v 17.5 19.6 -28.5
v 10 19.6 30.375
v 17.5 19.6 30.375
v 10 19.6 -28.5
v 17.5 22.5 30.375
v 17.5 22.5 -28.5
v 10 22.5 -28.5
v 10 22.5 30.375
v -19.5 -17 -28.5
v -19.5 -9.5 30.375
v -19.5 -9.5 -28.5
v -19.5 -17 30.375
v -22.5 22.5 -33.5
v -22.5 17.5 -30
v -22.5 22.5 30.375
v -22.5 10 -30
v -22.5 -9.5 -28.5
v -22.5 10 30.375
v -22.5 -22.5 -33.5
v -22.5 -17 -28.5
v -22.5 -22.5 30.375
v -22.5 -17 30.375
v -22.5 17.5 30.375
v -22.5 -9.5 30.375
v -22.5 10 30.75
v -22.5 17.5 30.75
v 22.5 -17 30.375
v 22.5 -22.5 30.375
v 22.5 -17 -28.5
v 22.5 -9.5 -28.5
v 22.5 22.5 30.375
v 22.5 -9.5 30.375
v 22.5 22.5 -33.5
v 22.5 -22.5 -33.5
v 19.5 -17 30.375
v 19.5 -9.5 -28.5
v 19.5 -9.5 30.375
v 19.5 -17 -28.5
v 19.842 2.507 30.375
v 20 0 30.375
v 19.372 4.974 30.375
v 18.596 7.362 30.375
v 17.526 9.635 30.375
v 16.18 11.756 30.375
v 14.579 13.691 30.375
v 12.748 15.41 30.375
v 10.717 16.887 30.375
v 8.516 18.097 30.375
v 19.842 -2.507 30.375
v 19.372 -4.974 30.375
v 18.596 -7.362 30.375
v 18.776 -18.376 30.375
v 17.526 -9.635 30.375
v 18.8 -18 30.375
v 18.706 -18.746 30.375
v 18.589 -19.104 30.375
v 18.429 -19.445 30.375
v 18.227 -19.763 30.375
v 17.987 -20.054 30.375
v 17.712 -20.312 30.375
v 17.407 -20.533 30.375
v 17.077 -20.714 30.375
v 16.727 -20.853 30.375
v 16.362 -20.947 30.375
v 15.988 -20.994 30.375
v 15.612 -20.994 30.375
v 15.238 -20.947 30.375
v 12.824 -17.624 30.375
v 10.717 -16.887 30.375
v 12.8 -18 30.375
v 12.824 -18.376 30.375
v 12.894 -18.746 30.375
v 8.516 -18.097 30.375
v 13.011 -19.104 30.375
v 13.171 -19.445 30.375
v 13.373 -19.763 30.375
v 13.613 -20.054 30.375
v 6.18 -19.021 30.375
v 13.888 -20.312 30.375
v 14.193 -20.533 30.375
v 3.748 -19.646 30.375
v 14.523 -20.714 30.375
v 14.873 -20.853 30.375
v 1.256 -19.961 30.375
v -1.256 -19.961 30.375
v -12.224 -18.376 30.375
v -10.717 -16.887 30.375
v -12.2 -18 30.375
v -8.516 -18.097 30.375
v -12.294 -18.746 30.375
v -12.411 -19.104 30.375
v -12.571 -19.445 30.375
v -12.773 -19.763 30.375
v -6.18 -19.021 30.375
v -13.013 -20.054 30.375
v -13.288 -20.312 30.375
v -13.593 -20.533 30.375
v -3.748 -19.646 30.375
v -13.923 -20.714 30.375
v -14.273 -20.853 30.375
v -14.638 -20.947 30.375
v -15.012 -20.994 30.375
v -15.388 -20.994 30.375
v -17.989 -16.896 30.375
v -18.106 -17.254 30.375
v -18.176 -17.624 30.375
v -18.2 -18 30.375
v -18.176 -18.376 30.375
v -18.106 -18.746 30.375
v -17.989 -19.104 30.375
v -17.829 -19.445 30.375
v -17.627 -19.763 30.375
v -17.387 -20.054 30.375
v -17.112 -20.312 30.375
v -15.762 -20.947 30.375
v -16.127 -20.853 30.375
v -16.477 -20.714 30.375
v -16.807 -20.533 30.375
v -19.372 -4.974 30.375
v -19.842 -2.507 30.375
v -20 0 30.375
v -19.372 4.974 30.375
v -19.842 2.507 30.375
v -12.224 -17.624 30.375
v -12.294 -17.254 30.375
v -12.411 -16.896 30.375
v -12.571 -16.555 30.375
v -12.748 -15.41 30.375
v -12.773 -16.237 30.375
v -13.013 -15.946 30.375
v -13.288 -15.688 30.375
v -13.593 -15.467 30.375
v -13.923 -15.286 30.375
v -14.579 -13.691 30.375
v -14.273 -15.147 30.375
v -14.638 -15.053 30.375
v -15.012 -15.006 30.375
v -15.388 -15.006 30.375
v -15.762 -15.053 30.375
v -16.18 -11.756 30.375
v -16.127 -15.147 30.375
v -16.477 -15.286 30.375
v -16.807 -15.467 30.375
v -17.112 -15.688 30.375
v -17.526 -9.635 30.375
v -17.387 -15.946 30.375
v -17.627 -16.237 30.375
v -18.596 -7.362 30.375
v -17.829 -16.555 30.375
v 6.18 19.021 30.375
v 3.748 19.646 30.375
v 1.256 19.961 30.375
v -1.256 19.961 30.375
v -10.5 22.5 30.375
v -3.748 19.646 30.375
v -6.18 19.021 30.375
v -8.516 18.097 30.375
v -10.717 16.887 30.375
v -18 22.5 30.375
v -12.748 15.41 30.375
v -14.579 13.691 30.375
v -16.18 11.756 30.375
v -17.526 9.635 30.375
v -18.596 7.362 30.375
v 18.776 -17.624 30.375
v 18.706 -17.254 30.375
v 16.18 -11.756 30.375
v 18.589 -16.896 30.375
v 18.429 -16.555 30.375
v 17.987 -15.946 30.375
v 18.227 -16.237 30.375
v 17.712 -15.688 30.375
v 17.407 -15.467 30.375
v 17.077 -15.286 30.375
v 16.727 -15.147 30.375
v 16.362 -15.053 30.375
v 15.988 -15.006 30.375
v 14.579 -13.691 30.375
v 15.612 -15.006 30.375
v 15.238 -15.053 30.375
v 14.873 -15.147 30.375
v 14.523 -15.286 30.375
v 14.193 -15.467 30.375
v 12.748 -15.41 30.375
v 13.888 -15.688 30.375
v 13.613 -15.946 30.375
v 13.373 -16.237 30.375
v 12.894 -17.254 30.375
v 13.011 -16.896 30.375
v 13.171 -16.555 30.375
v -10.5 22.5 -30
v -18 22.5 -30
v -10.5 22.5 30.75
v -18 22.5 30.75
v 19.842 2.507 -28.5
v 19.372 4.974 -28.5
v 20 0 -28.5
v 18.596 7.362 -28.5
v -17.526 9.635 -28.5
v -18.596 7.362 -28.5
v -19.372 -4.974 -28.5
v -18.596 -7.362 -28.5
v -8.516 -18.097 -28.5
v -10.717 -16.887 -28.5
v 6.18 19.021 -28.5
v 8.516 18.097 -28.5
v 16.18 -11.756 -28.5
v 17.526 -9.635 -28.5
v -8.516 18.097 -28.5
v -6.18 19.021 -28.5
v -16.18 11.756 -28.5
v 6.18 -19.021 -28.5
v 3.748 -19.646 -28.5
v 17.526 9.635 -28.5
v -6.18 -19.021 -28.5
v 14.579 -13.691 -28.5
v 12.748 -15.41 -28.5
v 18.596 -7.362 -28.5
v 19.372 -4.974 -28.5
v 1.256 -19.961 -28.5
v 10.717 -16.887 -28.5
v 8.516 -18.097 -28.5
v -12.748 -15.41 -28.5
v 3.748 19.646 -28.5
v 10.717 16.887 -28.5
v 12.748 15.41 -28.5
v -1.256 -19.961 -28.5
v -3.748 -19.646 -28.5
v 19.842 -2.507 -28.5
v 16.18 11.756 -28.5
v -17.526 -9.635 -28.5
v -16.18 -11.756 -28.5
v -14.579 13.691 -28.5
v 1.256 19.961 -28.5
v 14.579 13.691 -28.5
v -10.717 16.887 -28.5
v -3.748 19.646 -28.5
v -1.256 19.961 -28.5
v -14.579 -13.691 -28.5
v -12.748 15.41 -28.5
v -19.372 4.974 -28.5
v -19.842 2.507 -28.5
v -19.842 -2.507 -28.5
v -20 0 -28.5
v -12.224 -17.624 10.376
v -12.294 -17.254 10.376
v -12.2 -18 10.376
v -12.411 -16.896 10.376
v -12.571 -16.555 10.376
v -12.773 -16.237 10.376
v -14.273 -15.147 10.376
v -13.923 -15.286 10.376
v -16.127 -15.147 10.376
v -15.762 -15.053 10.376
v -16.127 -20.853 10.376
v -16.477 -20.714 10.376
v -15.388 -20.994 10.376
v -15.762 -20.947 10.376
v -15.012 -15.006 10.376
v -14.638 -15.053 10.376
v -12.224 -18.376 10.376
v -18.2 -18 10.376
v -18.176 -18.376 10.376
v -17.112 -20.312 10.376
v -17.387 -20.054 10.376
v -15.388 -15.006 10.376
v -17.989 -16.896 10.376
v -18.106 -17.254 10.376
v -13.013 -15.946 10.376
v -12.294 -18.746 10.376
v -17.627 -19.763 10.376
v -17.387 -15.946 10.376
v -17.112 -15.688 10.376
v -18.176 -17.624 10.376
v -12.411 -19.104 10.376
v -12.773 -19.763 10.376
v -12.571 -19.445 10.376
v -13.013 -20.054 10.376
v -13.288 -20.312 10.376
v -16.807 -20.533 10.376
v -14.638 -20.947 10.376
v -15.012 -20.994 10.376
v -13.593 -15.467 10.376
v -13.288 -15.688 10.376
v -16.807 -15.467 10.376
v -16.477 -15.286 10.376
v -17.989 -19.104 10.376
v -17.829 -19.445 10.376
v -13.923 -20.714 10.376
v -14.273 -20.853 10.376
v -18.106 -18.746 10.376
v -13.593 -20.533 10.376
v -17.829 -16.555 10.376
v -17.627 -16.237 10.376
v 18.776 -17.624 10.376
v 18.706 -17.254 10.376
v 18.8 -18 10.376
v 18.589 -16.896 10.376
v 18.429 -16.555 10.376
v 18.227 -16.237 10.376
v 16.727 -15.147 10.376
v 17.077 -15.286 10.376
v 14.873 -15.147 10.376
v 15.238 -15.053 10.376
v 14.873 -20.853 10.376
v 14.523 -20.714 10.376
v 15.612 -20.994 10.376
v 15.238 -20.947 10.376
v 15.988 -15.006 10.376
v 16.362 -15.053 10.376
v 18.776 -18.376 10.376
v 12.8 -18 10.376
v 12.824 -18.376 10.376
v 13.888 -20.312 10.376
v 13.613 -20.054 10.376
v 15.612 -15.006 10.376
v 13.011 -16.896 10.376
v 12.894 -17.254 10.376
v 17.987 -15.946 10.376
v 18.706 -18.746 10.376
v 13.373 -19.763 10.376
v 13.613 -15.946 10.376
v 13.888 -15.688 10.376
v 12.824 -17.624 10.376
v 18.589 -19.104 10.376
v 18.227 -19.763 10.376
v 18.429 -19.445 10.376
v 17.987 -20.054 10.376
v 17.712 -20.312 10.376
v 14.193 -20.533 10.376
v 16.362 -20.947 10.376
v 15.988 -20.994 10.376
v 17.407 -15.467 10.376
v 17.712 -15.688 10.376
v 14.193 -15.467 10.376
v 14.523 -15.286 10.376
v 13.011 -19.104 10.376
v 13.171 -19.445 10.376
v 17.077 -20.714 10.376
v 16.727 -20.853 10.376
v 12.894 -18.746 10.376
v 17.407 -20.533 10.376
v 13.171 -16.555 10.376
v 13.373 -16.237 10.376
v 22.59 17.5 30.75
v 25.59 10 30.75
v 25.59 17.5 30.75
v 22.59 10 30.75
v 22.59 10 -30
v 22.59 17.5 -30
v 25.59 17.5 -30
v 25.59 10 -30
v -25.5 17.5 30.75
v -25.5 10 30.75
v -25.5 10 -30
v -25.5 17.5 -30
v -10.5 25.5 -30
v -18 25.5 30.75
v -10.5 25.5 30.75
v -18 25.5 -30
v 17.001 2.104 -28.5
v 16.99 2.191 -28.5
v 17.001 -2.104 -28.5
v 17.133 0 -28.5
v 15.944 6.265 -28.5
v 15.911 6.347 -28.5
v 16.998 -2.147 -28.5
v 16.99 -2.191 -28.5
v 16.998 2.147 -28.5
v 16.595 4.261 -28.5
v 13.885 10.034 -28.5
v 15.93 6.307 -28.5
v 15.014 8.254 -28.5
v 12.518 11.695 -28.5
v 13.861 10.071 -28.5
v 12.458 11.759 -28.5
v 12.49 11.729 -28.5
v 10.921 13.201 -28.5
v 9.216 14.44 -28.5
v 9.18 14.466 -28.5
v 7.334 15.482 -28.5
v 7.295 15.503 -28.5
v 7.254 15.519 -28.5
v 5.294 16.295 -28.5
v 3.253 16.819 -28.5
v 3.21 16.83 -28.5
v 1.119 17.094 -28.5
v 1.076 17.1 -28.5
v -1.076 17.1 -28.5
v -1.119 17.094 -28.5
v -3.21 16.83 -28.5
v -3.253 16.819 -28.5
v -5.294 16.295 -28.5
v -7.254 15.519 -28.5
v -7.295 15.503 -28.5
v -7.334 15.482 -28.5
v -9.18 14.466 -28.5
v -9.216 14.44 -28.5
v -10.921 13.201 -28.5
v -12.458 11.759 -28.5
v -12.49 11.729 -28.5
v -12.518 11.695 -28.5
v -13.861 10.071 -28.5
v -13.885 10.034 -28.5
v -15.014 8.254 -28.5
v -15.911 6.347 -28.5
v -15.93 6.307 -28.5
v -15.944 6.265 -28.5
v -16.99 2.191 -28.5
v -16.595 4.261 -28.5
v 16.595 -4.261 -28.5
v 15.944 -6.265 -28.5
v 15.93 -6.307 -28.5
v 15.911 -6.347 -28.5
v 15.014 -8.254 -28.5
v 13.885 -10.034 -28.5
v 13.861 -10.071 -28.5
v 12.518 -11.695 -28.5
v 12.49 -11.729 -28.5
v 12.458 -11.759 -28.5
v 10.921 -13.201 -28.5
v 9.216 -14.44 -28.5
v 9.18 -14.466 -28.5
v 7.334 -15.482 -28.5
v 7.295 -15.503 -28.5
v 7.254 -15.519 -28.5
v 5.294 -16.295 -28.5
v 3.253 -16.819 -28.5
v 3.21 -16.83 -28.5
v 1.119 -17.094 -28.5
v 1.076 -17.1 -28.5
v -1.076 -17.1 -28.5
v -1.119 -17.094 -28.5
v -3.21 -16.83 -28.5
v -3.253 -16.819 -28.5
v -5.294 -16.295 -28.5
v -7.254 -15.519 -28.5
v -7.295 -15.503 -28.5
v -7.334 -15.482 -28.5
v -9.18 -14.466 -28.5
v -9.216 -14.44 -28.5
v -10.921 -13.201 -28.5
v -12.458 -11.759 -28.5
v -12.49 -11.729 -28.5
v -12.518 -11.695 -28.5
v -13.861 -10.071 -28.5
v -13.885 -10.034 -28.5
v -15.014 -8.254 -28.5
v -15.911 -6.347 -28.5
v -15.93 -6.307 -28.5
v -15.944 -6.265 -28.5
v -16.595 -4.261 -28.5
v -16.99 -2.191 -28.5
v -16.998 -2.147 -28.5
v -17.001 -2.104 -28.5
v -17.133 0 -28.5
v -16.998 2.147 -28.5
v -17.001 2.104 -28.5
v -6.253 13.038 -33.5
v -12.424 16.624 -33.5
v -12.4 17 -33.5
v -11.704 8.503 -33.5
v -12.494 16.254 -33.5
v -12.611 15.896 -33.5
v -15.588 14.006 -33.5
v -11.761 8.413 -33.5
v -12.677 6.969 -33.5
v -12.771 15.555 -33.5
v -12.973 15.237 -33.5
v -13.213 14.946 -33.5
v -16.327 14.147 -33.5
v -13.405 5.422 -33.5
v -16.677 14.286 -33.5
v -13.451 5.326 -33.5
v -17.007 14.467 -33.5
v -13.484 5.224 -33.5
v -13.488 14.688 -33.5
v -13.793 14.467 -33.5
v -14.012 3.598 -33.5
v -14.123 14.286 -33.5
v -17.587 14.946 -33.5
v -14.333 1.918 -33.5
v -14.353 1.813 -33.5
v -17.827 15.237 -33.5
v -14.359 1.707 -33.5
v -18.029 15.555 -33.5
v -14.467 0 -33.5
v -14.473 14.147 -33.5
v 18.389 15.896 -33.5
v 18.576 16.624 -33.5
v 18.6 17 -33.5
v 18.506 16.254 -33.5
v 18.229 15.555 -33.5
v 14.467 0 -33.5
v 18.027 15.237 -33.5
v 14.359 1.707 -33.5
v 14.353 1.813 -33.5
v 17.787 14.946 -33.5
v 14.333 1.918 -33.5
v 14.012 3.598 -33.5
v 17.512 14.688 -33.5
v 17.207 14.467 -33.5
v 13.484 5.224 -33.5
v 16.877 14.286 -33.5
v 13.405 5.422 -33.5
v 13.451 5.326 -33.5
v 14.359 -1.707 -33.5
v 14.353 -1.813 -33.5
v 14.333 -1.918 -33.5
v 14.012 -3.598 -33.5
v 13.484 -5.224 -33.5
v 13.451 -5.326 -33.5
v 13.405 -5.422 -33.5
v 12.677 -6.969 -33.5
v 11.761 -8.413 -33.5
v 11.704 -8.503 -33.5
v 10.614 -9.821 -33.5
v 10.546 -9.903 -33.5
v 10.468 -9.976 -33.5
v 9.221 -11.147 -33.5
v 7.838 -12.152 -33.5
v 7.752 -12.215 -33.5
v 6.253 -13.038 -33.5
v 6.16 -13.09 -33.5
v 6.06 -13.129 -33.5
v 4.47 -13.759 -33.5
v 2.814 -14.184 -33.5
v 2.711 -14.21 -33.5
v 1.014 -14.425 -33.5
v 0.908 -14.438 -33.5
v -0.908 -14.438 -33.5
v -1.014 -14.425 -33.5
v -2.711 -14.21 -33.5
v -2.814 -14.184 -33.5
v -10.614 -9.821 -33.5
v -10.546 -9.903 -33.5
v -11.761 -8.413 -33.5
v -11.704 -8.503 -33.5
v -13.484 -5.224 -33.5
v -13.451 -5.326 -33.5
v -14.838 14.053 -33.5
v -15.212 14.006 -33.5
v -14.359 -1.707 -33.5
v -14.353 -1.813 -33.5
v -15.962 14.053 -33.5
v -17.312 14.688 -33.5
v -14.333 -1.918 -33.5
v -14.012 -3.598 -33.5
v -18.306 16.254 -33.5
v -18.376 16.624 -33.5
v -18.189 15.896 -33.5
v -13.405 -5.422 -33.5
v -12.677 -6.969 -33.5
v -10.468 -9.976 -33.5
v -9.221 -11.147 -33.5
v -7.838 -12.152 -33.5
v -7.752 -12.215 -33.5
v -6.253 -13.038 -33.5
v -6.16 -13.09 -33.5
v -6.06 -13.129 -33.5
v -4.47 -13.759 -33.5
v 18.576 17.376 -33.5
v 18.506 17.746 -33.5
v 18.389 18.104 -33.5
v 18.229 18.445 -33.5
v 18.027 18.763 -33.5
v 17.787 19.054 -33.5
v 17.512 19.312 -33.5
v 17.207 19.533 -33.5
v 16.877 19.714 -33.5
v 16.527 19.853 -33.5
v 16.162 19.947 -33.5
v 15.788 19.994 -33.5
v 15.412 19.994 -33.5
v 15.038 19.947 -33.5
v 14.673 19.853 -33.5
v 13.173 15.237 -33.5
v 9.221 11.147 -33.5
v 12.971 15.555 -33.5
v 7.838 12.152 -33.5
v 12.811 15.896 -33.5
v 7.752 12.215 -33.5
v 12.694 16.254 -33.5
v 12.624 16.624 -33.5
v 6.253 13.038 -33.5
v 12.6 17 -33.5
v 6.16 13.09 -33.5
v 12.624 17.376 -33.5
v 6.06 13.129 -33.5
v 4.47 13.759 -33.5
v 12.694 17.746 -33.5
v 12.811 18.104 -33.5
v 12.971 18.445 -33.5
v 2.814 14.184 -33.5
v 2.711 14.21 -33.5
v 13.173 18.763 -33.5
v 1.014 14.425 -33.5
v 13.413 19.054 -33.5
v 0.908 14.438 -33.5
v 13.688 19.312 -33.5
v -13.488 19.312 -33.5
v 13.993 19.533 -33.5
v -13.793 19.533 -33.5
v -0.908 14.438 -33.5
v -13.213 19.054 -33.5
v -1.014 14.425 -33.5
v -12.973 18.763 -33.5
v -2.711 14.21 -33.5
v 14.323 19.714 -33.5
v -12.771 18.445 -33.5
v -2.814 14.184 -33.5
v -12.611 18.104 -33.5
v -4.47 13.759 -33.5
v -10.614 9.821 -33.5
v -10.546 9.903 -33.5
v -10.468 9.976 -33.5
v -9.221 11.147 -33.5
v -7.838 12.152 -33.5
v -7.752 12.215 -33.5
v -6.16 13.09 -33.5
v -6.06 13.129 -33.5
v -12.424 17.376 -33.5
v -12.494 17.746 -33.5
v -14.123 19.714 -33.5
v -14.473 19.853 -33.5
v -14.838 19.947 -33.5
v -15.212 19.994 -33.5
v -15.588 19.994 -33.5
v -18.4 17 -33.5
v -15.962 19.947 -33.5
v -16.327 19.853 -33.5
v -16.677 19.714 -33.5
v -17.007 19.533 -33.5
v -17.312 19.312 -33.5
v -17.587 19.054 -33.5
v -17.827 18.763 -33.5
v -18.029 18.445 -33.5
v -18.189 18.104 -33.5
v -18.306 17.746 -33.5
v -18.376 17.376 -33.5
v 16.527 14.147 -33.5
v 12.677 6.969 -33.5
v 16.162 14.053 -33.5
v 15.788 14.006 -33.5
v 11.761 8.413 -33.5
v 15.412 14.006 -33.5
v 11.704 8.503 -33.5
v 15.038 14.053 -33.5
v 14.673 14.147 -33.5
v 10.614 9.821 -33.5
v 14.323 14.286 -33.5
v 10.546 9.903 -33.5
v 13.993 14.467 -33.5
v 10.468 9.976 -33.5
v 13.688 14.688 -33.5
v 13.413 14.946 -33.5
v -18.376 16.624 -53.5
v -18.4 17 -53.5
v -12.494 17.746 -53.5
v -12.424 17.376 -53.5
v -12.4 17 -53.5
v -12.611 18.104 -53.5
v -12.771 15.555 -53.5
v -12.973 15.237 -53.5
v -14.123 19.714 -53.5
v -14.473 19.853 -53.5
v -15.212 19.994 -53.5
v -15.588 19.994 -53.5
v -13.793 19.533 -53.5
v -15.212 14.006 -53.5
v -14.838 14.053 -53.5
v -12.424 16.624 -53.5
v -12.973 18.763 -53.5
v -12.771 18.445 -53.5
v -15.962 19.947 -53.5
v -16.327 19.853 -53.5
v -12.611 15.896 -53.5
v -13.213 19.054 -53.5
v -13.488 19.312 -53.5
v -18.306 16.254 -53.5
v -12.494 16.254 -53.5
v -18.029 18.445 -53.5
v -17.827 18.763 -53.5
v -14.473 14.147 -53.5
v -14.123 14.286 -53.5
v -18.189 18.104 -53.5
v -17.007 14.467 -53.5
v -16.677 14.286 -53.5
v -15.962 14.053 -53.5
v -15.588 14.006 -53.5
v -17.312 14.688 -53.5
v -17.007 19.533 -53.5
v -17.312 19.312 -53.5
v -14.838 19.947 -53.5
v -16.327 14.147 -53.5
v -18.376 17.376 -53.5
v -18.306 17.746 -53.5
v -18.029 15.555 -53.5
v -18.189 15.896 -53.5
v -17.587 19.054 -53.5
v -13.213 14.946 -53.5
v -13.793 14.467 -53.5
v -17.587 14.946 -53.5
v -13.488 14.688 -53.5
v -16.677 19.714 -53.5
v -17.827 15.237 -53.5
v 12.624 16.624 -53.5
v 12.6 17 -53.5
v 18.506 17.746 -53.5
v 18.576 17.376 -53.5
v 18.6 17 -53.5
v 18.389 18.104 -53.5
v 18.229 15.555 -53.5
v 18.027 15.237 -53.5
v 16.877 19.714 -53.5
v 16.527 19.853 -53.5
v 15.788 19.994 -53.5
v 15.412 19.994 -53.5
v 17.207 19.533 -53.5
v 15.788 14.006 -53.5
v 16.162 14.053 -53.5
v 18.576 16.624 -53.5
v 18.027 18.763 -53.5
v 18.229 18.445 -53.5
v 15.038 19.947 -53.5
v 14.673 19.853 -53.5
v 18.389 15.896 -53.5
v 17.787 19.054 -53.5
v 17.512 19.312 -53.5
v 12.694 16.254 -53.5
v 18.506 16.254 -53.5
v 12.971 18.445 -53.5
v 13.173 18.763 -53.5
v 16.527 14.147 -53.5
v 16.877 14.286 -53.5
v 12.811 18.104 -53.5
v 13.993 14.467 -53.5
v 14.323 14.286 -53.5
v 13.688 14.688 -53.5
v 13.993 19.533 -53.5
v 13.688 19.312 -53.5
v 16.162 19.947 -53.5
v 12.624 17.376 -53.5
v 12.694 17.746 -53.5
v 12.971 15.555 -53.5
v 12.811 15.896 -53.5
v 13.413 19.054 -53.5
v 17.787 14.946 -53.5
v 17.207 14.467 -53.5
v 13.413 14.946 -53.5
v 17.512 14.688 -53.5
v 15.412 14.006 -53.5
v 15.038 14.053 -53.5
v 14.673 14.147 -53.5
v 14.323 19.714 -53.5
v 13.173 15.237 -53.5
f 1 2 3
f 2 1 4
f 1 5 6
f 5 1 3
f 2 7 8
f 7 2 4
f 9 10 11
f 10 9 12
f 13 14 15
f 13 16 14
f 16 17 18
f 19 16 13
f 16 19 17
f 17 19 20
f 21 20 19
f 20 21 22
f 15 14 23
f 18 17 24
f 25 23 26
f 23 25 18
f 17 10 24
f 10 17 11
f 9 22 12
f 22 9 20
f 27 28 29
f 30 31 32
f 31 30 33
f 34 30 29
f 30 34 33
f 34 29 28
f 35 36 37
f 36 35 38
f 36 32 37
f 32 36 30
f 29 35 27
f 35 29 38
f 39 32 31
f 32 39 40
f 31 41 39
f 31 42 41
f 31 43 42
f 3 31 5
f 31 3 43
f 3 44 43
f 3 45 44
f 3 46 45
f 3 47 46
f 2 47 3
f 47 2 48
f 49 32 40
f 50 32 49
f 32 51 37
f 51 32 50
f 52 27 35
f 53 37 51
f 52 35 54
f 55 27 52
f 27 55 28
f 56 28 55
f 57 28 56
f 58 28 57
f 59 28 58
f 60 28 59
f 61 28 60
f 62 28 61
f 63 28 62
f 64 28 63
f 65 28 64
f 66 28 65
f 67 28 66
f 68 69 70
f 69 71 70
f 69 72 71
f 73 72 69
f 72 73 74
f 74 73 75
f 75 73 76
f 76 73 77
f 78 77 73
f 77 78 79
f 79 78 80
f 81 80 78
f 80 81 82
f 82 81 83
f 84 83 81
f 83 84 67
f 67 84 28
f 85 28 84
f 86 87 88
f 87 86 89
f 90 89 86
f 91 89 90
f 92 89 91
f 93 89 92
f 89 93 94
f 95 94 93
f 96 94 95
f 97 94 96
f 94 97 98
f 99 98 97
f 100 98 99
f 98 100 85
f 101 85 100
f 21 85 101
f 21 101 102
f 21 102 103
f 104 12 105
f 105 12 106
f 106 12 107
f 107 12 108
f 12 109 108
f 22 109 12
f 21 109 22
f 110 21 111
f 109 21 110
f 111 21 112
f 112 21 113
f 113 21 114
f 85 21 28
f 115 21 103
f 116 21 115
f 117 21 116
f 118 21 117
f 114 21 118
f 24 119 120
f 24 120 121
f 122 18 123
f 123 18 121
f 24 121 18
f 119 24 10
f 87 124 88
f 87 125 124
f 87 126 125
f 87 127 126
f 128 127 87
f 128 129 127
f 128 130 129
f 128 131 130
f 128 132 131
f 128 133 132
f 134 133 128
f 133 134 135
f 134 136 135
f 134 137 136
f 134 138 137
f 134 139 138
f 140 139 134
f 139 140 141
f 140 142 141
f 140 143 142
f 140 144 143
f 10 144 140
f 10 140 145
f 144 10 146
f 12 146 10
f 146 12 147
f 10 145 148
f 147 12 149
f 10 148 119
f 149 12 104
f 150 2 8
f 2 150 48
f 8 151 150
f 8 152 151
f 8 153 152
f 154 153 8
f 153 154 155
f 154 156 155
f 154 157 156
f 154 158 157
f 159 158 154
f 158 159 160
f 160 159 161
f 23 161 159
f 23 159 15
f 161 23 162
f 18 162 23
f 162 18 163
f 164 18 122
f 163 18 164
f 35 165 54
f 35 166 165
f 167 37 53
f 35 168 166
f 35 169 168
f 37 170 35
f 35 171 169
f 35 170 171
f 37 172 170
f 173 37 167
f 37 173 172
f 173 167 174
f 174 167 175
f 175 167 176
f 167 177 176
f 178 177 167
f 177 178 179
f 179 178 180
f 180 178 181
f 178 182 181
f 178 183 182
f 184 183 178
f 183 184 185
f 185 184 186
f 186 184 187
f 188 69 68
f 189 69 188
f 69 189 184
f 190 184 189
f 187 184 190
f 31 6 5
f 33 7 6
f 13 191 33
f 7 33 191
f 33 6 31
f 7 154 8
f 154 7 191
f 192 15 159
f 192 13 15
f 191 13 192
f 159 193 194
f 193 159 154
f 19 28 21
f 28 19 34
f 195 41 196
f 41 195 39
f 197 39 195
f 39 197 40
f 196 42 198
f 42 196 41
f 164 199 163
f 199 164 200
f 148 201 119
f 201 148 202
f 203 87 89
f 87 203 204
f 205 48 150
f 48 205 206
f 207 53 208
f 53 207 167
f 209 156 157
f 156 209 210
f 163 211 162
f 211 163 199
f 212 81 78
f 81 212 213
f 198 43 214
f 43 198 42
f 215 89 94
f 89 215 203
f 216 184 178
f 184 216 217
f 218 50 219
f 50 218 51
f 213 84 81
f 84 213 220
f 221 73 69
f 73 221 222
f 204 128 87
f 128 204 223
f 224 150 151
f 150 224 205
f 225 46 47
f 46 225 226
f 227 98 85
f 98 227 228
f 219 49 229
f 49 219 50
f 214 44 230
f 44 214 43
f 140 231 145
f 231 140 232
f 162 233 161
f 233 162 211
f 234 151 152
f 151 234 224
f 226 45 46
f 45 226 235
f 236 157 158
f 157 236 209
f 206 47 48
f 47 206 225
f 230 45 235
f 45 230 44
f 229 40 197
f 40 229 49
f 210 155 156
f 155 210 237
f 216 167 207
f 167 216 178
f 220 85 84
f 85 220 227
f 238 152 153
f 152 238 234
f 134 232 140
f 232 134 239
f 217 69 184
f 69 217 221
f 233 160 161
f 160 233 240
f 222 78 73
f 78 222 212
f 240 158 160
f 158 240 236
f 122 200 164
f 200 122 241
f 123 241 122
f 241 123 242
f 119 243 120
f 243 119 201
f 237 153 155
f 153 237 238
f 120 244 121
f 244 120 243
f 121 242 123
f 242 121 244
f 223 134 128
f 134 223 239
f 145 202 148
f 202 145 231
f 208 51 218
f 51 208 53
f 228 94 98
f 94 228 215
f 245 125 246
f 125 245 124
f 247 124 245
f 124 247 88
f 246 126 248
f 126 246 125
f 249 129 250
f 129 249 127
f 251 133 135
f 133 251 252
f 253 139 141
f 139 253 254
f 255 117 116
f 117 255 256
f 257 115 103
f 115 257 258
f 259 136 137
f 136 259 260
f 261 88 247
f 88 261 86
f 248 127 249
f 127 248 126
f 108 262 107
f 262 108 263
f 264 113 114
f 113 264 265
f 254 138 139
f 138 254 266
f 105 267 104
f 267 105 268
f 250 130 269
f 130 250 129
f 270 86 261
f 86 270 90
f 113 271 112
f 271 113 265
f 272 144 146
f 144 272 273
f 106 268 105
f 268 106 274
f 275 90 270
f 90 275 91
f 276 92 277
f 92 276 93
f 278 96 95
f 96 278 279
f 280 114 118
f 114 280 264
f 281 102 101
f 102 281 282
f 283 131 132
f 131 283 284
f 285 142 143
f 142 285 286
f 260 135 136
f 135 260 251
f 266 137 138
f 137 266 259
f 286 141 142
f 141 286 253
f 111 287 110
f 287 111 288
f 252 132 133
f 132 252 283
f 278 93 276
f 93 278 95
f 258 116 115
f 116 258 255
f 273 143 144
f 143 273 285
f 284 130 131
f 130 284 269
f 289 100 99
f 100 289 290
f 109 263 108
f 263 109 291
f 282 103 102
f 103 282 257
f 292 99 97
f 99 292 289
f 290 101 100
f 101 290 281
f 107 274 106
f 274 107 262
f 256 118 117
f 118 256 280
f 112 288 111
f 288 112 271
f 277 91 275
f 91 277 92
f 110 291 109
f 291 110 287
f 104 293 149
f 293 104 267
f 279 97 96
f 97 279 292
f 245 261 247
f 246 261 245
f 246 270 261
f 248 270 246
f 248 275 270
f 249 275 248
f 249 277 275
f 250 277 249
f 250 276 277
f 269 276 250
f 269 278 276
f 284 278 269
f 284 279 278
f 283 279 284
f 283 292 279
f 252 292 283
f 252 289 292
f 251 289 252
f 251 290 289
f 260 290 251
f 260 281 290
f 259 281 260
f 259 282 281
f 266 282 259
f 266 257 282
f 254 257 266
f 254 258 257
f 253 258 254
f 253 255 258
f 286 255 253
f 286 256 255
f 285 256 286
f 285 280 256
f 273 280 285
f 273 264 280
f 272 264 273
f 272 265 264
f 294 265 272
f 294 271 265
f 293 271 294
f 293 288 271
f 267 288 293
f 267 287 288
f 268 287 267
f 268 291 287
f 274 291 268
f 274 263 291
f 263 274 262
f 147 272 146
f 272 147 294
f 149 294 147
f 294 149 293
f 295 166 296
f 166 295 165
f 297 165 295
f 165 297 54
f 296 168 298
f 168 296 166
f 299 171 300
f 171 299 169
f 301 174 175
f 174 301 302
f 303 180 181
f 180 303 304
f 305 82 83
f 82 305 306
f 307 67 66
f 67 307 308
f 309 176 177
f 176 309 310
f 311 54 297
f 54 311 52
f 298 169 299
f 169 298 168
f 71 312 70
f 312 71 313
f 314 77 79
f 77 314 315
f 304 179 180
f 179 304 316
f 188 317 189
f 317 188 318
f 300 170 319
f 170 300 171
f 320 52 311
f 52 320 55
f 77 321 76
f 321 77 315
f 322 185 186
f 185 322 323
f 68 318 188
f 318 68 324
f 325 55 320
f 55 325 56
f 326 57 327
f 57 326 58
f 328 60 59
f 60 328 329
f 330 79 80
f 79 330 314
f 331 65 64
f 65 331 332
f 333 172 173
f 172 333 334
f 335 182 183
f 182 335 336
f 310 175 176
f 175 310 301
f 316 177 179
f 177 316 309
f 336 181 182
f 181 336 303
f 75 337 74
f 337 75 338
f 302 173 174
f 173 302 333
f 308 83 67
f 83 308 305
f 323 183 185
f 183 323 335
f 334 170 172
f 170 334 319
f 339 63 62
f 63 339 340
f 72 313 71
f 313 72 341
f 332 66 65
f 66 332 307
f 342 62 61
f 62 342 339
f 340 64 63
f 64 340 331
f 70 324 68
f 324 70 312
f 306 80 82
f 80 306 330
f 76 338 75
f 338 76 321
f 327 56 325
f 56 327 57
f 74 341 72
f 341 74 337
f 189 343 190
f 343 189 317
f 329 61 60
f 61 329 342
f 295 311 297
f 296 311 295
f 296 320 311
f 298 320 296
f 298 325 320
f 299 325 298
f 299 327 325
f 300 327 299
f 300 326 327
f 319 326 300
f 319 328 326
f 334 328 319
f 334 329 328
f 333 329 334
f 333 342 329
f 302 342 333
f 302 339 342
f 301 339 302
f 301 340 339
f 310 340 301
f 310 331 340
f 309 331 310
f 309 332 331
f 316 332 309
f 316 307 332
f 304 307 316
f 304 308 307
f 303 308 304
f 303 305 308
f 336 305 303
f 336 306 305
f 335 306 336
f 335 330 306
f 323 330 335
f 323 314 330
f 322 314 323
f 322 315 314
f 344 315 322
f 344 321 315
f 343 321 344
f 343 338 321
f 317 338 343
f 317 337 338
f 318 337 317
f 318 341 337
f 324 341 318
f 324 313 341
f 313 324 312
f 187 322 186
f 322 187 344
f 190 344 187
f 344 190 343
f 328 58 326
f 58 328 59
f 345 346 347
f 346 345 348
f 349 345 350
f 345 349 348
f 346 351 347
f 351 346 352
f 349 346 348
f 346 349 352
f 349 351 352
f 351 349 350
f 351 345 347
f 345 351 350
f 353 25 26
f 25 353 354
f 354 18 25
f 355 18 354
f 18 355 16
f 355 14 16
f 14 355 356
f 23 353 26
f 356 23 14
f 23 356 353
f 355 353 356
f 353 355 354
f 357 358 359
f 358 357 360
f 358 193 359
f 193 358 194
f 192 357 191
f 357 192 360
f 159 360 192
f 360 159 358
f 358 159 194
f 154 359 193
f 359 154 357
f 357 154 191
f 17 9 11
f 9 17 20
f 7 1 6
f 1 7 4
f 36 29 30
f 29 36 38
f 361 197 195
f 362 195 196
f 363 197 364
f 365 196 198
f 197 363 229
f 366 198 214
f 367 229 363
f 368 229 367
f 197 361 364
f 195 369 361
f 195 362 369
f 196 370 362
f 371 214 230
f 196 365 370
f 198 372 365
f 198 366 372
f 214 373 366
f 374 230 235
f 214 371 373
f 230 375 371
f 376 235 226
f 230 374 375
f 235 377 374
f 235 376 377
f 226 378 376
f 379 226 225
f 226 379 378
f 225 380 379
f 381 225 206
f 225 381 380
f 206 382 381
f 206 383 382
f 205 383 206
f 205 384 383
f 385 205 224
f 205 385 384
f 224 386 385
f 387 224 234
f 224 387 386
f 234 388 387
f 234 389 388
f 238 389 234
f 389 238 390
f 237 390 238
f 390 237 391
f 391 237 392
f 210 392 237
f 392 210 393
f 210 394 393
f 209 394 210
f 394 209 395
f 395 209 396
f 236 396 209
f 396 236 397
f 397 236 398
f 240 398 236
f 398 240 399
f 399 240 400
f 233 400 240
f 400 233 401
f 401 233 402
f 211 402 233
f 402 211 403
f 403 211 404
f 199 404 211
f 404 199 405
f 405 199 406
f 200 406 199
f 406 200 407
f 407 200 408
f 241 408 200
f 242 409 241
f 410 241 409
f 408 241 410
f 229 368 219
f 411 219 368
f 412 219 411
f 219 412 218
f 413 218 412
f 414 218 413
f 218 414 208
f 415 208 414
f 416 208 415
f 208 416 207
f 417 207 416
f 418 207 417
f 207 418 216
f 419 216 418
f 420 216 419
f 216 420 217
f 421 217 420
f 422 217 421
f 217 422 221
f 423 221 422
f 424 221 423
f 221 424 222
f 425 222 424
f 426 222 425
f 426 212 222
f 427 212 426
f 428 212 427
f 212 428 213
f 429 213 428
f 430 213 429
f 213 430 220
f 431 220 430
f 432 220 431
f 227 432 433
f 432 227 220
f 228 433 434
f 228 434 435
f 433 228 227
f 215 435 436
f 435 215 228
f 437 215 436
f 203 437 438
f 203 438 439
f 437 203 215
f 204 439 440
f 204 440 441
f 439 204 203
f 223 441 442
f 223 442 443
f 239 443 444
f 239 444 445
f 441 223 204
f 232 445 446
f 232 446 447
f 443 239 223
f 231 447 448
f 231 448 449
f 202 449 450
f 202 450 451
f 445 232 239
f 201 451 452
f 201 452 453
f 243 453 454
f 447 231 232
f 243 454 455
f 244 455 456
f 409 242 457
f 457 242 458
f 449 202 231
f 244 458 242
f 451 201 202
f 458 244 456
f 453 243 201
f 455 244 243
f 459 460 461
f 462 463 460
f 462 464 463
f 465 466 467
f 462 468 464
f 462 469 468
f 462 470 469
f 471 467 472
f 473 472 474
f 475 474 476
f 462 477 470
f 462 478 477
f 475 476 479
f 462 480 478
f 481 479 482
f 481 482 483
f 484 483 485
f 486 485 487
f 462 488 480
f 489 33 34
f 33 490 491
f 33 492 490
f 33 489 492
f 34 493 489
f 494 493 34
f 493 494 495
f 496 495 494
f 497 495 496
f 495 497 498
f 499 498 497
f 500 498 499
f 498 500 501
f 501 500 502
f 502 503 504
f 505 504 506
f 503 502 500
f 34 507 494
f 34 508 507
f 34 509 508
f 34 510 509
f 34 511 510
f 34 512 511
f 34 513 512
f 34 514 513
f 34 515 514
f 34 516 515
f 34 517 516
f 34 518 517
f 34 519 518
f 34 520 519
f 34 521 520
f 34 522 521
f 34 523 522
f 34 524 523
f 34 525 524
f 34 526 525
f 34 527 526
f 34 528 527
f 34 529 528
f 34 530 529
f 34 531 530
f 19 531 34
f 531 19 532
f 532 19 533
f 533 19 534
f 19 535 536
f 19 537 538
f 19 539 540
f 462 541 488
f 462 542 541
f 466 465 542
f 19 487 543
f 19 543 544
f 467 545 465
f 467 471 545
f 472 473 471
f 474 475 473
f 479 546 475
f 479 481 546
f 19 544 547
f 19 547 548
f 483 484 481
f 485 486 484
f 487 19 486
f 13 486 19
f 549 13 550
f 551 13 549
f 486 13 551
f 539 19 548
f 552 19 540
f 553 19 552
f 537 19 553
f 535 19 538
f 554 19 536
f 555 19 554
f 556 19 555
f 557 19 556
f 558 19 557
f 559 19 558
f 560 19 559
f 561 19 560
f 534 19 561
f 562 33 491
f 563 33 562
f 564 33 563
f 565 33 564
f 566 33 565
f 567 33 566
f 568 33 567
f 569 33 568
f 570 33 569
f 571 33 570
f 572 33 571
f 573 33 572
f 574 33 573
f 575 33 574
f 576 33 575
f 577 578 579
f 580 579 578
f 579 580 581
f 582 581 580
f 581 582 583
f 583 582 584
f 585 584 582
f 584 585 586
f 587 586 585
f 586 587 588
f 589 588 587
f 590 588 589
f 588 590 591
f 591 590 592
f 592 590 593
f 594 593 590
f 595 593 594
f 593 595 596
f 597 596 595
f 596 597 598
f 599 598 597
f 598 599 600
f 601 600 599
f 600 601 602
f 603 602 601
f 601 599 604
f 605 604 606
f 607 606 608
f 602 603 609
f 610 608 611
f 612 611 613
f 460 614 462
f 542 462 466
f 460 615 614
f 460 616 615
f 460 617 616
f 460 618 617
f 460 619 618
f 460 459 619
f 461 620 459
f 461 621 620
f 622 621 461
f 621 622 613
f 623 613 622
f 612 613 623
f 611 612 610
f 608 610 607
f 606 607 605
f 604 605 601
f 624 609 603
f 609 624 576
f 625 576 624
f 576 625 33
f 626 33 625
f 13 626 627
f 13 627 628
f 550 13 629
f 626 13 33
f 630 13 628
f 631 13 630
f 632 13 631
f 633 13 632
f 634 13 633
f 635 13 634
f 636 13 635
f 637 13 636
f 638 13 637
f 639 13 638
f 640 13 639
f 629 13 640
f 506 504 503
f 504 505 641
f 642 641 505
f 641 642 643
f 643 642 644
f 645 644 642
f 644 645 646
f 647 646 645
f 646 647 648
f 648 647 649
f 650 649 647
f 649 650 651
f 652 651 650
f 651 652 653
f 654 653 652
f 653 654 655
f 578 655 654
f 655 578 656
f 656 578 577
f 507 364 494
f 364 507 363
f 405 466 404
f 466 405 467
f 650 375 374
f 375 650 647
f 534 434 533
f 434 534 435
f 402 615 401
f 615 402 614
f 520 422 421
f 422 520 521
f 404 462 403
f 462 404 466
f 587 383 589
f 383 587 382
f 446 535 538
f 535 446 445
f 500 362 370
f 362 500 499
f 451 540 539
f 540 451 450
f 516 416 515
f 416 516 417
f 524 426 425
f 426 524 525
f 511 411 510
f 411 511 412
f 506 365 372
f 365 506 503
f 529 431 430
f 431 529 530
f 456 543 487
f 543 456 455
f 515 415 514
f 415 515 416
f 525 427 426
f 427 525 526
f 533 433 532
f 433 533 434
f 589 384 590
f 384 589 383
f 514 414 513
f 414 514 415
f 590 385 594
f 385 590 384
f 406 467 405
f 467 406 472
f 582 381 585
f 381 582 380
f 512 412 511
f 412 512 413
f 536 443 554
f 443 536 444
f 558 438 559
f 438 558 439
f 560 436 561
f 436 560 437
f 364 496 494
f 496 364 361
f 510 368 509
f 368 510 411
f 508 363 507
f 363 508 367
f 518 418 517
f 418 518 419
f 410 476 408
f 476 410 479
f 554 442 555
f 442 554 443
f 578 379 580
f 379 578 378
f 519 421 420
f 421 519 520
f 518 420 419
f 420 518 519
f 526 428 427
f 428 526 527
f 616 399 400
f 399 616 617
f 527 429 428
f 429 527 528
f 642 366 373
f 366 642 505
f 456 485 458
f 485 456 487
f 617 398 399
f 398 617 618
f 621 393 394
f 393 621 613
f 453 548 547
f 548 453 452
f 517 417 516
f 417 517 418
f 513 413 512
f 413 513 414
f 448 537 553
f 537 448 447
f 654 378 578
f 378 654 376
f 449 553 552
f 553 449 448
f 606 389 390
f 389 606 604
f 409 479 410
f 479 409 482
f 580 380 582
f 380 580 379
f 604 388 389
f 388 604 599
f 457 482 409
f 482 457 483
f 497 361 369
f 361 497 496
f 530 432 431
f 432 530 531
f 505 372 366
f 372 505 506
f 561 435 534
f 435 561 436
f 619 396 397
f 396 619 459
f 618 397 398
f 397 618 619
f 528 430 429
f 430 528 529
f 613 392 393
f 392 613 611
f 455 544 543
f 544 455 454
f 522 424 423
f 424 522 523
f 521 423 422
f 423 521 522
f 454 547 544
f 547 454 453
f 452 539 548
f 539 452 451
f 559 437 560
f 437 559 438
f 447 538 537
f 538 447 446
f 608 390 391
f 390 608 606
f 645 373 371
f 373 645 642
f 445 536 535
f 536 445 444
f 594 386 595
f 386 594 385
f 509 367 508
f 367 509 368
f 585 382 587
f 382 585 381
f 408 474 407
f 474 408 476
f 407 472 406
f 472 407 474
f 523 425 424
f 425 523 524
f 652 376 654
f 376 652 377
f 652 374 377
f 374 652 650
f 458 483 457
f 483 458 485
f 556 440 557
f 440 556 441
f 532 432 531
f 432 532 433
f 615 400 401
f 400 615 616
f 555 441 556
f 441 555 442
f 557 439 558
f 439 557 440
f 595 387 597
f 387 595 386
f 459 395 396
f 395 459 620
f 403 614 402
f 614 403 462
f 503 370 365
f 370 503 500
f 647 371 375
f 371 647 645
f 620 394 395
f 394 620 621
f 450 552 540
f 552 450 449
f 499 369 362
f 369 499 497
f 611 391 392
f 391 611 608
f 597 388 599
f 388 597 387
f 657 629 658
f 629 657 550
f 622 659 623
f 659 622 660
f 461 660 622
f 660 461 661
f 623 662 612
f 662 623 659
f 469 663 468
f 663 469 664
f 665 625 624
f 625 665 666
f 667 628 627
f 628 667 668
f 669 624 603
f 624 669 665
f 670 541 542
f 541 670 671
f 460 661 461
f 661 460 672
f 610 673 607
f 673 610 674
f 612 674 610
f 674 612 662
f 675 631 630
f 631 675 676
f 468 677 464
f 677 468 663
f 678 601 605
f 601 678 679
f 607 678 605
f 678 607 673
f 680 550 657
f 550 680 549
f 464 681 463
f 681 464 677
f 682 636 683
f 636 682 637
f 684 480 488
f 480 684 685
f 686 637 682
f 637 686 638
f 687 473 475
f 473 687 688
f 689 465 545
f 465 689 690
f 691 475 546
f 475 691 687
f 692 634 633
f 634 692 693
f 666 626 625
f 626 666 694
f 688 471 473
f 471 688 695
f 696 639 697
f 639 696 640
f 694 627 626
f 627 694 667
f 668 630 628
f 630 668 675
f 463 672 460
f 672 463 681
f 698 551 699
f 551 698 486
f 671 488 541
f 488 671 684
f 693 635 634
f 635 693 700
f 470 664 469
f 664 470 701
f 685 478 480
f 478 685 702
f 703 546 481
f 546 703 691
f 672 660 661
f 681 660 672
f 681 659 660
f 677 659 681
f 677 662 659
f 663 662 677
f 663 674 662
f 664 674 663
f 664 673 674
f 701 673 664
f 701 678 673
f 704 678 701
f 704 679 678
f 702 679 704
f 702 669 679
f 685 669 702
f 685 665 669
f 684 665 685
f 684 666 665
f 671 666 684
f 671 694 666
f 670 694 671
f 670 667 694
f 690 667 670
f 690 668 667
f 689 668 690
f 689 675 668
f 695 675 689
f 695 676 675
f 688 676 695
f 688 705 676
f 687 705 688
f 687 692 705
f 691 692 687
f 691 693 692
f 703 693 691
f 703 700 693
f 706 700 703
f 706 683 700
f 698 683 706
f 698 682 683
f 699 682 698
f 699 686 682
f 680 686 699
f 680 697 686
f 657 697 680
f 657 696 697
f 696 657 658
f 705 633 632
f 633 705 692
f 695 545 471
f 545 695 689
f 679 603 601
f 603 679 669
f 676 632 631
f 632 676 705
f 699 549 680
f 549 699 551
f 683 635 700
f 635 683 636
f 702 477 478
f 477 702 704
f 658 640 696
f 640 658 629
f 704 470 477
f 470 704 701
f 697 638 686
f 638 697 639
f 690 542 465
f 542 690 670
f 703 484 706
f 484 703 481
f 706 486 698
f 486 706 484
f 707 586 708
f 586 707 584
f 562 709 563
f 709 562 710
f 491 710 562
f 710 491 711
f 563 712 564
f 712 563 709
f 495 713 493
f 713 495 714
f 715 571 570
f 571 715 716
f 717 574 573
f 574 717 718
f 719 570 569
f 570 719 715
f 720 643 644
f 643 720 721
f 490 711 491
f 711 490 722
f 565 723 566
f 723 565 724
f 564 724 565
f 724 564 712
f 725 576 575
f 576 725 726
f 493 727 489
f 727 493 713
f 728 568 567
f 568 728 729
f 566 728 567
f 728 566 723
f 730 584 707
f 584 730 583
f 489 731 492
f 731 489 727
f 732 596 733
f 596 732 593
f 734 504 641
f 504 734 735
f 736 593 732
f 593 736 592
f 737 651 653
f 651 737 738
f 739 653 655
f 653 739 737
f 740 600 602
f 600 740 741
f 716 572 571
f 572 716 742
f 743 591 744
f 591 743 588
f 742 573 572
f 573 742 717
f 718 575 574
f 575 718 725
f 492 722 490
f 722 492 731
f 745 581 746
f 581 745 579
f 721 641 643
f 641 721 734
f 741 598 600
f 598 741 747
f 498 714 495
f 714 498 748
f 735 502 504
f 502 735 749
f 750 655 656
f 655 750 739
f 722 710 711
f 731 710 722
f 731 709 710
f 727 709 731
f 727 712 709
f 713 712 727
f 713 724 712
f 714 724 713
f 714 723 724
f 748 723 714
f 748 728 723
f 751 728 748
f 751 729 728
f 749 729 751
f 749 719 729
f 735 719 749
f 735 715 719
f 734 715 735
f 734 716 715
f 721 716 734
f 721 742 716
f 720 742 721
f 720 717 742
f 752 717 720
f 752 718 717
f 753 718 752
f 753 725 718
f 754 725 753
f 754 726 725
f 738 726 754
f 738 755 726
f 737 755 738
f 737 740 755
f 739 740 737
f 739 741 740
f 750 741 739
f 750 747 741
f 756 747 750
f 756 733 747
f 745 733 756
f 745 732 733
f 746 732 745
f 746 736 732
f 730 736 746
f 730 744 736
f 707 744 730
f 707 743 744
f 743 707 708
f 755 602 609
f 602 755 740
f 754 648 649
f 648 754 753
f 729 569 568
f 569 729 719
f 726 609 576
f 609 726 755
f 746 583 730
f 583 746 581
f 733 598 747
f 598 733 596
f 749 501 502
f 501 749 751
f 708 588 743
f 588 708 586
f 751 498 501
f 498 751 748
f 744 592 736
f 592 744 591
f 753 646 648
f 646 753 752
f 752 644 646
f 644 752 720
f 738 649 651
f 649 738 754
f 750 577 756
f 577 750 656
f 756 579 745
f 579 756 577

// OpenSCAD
////////////////////////////////////////////////
/////////////Open SCAD /////////////////////////
////////////////////////////////////////////////

///date started///2016
//date finished
//modler @paradroid_
//totalhight : 12.15 121,5
//Innredurchmesser : 2.81cm (28,1mm)
//ausedurchmesser : 3.629cm (36.29mm)




////////////////////////////////////////////////
////////////////////parameters//////////////////
////////////////////////////////////////////////

radius_mainCylinder= 20;

width_mainCube=45;
length_mainCube=45;

width_Connectors = 3;
length_Connectors = 7.5;
hight_mainCube = 60.75;

width_bottomPlate=45; 
length_bottomPlate=45; 
hight_bottomPlate=5;


hight_Leg= 20;
radius_Leg=3;

////////////////////////////////////////////////
/////////////////////renders////////////////////
////////////////////////////////////////////////<f
difference(){
mainCube();
    
    translate([-18,-2,])legconnectors();
    translate([13,-2,])legconnectors();
    
}
translate() 

connectorpos();

difference(){

translate([0,0,-25]) 
    
    bottomplate();
    
    rotate([180])
    hole();
}


translate([-15.4, 20, -25]) legs();
translate([15.6,  20, -25]) legs();

//translate([ 1.5, -1.5, 0]) legs();
///translate([ 1.5,  1.5, 0]) legs();

////////////////////////////////////////////////
////////////////////modules/////////////////////
////////////////////////////////////////////////
$fn = 50;

module mainCube(){
    difference(){
        union() {
            cube([width_mainCube, length_mainCube, hight_mainCube], center=true);
        }
        cylinder(hight_mainCube, radius_mainCylinder, radius_mainCylinder, center=true);
    
    union() {
        rotate([0,0,270]){
            translate([-22.6,10,-30]) cube([width_Connectors, length_Connectors, hight_mainCube]);
        }
        
        translate([-22.5,-17,-30]) cube([width_Connectors, length_Connectors, hight_mainCube]);
    
    translate([19.5, -17, -30]) cube([width_Connectors, length_Connectors, hight_mainCube]);
    
//    translate([19.5, 10, -30]) cube([width_Connectors, length_Connectors, hight_mainCube]);
    
}
}
}
module bottomplate(){

        translate([0, 0, -6])
            cube([width_bottomPlate, length_bottomPlate, hight_bottomPlate], center=true);

            
}
 
module legconnectors(){
   translate([2.8, -16 ,10.376])
       cylinder (hight_Leg, radius_Leg, radius_Leg);
}
module legs(){ 
    translate([0, -3, -18.5])
        cylinder (hight_Leg, radius_Leg, radius_Leg, center=true );
}
module connectors(){
    translate([-5, 3.5, -5]){
    cube([width_Connectors, length_Connectors, hight_mainCube]);
   

}
}
module connectorpos(){
    rotate([0,0,90]){
    union() {
//        translate([-25,10.5,-30]) cube([width_Connectors, length_Connectors, hight_mainCube]);
        rotate([0,0,90]){
            translate([-25.59,-17.5,-30]) cube([width_Connectors, length_Connectors, hight_mainCube]);
    }   
}
    rotate([0,0,90]){
    translate([22.5, -17.5, -30]) cube([width_Connectors, length_Connectors, hight_mainCube]);
    }
    translate([22.5, 10.5, -30]) cube([width_Connectors, length_Connectors, hight_mainCube]);
    
   // rotate([90,90,0]){
    //translate([-33,10,-30]) #cube([width_Connectors, length_Connectors, hight_mainCube]);
        
      //      translate([-33,-17,-30]) #cube([width_Connectors, length_Connectors, hight_mainCube]);
    //rotate([90,0,0]){
    //translate([-34, -18, -30]) #cube([width_Connectors, length_Connectors, hight_mainCube]);
    
    //translate([-34, 10, -30]) #cube([width_Connectors, length_Connectors, hight_mainCube]);
    }
    }



//translate ([-10,-10,20])#cube(20);
module hole(){        
    translate ([0, 0, 25])
  cylinder(30, 19, 3);
}

module Newconnector(){
    cube([]);
}

//module connetorTry
